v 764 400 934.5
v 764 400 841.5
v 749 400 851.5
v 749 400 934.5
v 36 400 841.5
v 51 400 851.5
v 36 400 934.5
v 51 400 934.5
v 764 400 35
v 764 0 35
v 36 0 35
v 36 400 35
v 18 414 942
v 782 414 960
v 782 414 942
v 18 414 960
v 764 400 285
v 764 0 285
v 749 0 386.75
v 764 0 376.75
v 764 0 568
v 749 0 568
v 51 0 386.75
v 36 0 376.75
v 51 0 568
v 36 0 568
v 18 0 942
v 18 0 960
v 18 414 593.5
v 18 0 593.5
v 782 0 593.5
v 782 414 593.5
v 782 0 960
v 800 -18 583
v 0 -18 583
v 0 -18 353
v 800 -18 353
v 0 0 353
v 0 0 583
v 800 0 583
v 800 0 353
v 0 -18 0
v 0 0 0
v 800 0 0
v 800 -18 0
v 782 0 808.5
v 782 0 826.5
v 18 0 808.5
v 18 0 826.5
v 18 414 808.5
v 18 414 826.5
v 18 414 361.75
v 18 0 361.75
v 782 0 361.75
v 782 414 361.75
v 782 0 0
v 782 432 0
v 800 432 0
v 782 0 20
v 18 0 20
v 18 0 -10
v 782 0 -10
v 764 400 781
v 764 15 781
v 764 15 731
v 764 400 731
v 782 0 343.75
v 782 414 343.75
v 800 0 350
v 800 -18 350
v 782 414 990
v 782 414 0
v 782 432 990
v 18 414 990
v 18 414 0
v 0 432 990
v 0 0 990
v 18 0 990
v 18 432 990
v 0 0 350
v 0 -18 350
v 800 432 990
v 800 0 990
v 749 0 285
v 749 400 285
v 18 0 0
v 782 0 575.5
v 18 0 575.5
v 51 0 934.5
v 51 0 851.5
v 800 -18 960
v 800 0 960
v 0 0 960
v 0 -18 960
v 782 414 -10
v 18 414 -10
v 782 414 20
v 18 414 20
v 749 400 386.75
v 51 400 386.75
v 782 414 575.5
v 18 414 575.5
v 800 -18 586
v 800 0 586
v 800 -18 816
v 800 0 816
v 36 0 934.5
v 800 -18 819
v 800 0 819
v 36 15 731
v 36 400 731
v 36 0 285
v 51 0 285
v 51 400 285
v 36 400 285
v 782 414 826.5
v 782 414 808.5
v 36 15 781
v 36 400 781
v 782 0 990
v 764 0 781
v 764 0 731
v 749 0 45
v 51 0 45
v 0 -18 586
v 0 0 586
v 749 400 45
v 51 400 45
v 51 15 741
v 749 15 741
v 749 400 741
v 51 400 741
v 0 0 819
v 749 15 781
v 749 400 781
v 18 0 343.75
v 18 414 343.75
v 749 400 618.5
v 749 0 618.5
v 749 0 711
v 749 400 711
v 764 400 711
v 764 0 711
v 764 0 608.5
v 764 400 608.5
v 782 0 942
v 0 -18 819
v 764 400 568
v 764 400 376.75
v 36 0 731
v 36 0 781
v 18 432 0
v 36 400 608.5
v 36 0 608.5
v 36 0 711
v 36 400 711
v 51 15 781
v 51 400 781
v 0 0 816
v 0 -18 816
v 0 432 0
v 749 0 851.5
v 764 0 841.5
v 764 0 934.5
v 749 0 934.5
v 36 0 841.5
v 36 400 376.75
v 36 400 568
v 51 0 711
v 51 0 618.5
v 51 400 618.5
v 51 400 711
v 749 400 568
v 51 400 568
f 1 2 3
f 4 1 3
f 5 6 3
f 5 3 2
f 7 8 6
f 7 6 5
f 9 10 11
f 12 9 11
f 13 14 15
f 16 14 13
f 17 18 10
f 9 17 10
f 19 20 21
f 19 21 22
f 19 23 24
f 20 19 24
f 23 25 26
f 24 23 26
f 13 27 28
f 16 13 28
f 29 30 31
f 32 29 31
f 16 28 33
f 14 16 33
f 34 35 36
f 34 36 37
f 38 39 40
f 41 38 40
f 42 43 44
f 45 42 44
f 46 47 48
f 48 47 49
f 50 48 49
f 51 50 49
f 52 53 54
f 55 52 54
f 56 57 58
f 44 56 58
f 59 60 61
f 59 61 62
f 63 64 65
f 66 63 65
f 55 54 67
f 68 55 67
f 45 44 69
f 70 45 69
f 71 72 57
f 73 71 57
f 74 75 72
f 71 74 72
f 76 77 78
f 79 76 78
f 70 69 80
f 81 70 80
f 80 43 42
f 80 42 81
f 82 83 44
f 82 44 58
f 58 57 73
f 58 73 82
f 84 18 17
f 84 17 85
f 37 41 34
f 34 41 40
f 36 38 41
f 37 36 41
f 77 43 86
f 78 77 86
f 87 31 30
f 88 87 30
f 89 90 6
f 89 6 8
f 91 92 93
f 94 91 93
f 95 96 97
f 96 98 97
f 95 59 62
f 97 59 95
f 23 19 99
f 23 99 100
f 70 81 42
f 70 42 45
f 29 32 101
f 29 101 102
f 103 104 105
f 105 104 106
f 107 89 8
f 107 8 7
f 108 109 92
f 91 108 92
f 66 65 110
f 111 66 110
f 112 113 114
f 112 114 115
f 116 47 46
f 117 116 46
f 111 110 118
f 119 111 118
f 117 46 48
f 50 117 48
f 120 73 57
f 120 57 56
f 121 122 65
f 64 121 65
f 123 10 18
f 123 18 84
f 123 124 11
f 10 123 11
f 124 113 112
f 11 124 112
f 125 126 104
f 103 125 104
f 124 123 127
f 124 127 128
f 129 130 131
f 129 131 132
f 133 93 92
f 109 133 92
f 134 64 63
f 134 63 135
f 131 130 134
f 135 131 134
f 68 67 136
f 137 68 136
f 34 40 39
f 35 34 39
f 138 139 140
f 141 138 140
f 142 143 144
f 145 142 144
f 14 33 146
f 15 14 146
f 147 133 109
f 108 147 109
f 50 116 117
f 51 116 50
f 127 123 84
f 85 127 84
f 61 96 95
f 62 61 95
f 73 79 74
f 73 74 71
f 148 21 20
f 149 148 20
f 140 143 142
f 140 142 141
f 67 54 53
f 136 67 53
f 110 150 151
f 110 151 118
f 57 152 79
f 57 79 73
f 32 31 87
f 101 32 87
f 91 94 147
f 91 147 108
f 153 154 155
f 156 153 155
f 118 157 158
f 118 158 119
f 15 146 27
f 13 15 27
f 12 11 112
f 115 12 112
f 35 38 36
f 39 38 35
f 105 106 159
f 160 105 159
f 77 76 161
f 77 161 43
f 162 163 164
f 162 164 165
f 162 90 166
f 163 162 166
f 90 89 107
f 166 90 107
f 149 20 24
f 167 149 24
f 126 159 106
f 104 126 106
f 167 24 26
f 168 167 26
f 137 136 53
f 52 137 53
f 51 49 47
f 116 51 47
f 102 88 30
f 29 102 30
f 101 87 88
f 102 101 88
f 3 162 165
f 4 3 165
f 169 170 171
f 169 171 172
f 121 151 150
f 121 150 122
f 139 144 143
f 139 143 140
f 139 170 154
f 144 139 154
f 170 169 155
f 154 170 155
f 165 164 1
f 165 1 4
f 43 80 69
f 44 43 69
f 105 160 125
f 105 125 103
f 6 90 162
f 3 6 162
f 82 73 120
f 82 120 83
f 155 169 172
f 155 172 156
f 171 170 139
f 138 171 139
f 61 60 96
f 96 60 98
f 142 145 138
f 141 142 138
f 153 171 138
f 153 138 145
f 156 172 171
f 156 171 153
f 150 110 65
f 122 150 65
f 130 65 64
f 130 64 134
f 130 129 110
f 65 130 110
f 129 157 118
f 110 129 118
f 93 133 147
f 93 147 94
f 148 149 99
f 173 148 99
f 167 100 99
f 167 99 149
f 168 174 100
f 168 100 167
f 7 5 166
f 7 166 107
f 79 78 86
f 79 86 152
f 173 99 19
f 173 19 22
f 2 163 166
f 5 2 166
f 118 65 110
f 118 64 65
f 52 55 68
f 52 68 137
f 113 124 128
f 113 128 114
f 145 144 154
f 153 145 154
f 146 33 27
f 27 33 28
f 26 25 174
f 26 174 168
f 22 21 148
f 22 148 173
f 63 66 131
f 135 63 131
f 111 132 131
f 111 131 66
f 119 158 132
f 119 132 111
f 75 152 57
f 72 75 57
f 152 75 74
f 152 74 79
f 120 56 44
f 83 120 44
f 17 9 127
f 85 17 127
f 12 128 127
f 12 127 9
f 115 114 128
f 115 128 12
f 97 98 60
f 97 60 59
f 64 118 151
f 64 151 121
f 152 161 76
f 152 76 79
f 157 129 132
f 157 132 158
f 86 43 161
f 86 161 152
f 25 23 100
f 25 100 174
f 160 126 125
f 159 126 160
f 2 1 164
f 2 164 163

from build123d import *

# Parameters (mm, degrees)
F0_W           = 18
F0_H           = 414
F0_H_2         = 18
F1_DEPTH       = 990
F0_W_2         = 764
F2_DEPTH       = 990
F3_DEPTH       = 20
F3_DEPTH_BACK  = 10
F4_W           = 782
F4_H           = 141
F4_W_2         = 18
F5_DEPTH       = 18
F4_W_3         = 600
F4_H_2         = 230
F4_W_4         = 3
F4_W_5         = 179
F4_W_6         = 582
F4_W_7         = 197
F4_H_3         = 350
F7_DEPTH       = 414
F6_W           = 698
F6_H           = 18
F6_W_2         = 15
F6_H_2         = 10
F6_H_3         = 83
F8_DEPTH       = 400
F6_H_4         = 40
F6_H_5         = 92.5
F6_H_6         = 181.2495863438
F6_H_7         = 240
F9_W           = 15
F9_H           = 15
F9_W_2         = 698
F10_DEPTH      = 40
F10_DEPTH_BACK = 10


# Not quite as in the source:
# - a feature names something its author has since deleted; it is built from what else it names


with BuildPart() as f1:
    # F0 (on Top) → F1 (new body)
    with BuildSketch(Plane.XY):
        with Locations((9, 207)):
            Rectangle(F0_W, F0_H)
        with Locations((9, 423)):
            Rectangle(F0_W, F0_H_2)
    extrude(amount=F1_DEPTH)


with BuildPart() as f1b:
    # F0 (on Top) → F1, piece 2 (new body)
    with BuildSketch(Plane.XY):
        with Locations((791, 423)):
            Rectangle(F0_W, F0_H_2)
        with Locations((791, 207)):
            Rectangle(F0_W, F0_H)
    extrude(amount=F1_DEPTH)


with BuildPart() as f2:
    # F0 (on Top) → F2 (new body, through all)
    with BuildSketch(Plane.XY):
        with Locations((400, 423)):
            Rectangle(F0_W_2, F0_H_2)
    extrude(amount=F2_DEPTH)


with BuildPart() as f3:
    # F0 (on Top) → F3 (new body, two sides)
    with BuildSketch(Plane.XY) as f3_sk:
        with Locations((400, 207)):
            Rectangle(F0_W_2, F0_H)
    extrude(amount=F3_DEPTH)
    extrude(f3_sk.sketch, amount=-F3_DEPTH_BACK)


with BuildPart() as f5:
    # F4 (on face) → F5 (new body)
    with BuildSketch(Plane.XZ):
        with Locations((409, 889.5)):
            Rectangle(F4_W, F4_H)
        with Locations((9, 889.5)):
            Rectangle(F4_W_2, F4_H)
    extrude(amount=F5_DEPTH)


with BuildPart() as f5b:
    # F4 (on face) → F5, piece 2 (new body)
    with BuildSketch(Plane.XZ):
        with Locations((500, 701)):
            Rectangle(F4_W_3, F4_H_2)
        with Locations((198.5, 701)):
            Rectangle(F4_W_4, F4_H_2)
        with Locations((107.5, 701)):
            Rectangle(F4_W_5, F4_H_2)
        with Locations((9, 701)):
            Rectangle(F4_W_2, F4_H_2)
    extrude(amount=F5_DEPTH)


with BuildPart() as f5c:
    # F4 (on face) → F5, piece 3 (new body)
    with BuildSketch(Plane.XZ):
        with Locations((309, 468)):
            Rectangle(F4_W_6, F4_H_2)
        with Locations((9, 468)):
            Rectangle(F4_W_2, F4_H_2)
        with Locations((601.5, 468)):
            Rectangle(F4_W_4, F4_H_2)
        with Locations((701.5, 468)):
            Rectangle(F4_W_7, F4_H_2)
    extrude(amount=F5_DEPTH)


with BuildPart() as f5d:
    # F4 (on face) → F5, piece 4 (new body)
    with BuildSketch(Plane.XZ):
        with Locations((107.5, 175)):
            Rectangle(F4_W_5, F4_H_3)
        with Locations((9, 175)):
            Rectangle(F4_W_2, F4_H_3)
        with Locations((500, 175)):
            Rectangle(F4_W_3, F4_H_3)
        with Locations((198.5, 175)):
            Rectangle(F4_W_4, F4_H_3)
    extrude(amount=F5_DEPTH)


with BuildPart() as f7:
    # F6 (on face) → F7 (new body, through all)
    with BuildSketch(Plane(origin=(0, 0, 0), x_dir=(-1, 0, 0), z_dir=(0, 1, 0))):
        Polygon((-782, 960), (-782, 942), (-764, 942), (-749, 942), (-36, 942), (-18, 942), (-18, 960), align=None)
    extrude(amount=F7_DEPTH)


with BuildPart() as f7b:
    # F6 (on face) → F7, piece 2 (new body, through all)
    with BuildSketch(Plane(origin=(0, 0, 0), x_dir=(-1, 0, 0), z_dir=(0, 1, 0))):
        Polygon((-764, 826.5), (-782, 826.5), (-782, 819), (-18, 819), (-18, 826.5), (-36, 826.5), align=None)
        Polygon((-18, 819), (-782, 819), (-782, 808.5), (-764, 808.5), (-749, 808.5), (-51, 808.5), (-36, 808.5), (-18, 808.5), align=None)
    extrude(amount=F7_DEPTH)


with BuildPart() as f7c:
    # F6 (on face) → F7, piece 3 (new body, through all)
    with BuildSketch(Plane(origin=(0, 0, 0), x_dir=(-1, 0, 0), z_dir=(0, 1, 0))):
        Polygon((-764, 593.5), (-782, 593.5), (-782, 575.5), (-764, 575.5), (-749, 575.5), (-749, 593.5), align=None)
        with Locations((-400, 584.5)):
            Rectangle(F6_W, F6_H)
        Polygon((-36, 593.5), (-51, 593.5), (-51, 575.5), (-36, 575.5), (-18, 575.5), (-18, 593.5), align=None)
    extrude(amount=F7_DEPTH)


with BuildPart() as f7d:
    # F6 (on face) → F7, piece 4 (new body, through all)
    with BuildSketch(Plane(origin=(0, 0, 0), x_dir=(-1, 0, 0), z_dir=(0, 1, 0))):
        Polygon((-764, 361.7504136562), (-782, 361.7504136562), (-782, 343.7504136562), (-764, 343.7504136562), (-749, 343.7504136562), (-749, 361.7504136562), align=None)
        with Locations((-400, 352.7504136562)):
            Rectangle(F6_W, F6_H)
        Polygon((-36, 361.7504136562), (-51, 361.7504136562), (-51, 343.7504136562), (-36, 343.7504136562), (-18, 343.7504136562), (-18, 361.7504136562), align=None)
    extrude(amount=F7_DEPTH)


with BuildPart() as f8:
    # F6 (on face) → F8 (new body)
    with BuildSketch(Plane(origin=(0, 0, 0), x_dir=(-1, 0, 0), z_dir=(0, 1, 0))):
        with Locations((-756.5, 846.5)):
            Rectangle(F6_W_2, F6_H_2)
        with Locations((-43.5, 846.5)):
            Rectangle(F6_W_2, F6_H_2)
        with Locations((-756.5, 893)):
            Rectangle(F6_W_2, F6_H_3)
        with Locations((-400, 846.5)):
            Rectangle(F6_W, F6_H_2)
        with Locations((-43.5, 893)):
            Rectangle(F6_W_2, F6_H_3)
    extrude(amount=F8_DEPTH)


with BuildPart() as f8b:
    # F6 (on face) → F8, piece 2 (new body)
    with BuildSketch(Plane(origin=(0, 0, 0), x_dir=(-1, 0, 0), z_dir=(0, 1, 0))):
        with Locations((-756.5, 761)):
            Rectangle(F6_W_2, F6_H_4)
        with Locations((-756.5, 736)):
            Rectangle(F6_W_2, F6_H_2)
        with Locations((-43.5, 761)):
            Rectangle(F6_W_2, F6_H_4)
        with Locations((-400, 736)):
            Rectangle(F6_W, F6_H_2)
        with Locations((-43.5, 736)):
            Rectangle(F6_W_2, F6_H_2)
    extrude(amount=F8_DEPTH)


with BuildPart() as f8c:
    # F6 (on face) → F8, piece 3 (new body)
    with BuildSketch(Plane(origin=(0, 0, 0), x_dir=(-1, 0, 0), z_dir=(0, 1, 0))):
        with Locations((-756.5, 613.5)):
            Rectangle(F6_W_2, F6_H_2)
        with Locations((-756.5, 664.75)):
            Rectangle(F6_W_2, F6_H_5)
        with Locations((-400, 613.5)):
            Rectangle(F6_W, F6_H_2)
        with Locations((-43.5, 613.5)):
            Rectangle(F6_W_2, F6_H_2)
        with Locations((-43.5, 664.75)):
            Rectangle(F6_W_2, F6_H_5)
    extrude(amount=F8_DEPTH)


with BuildPart() as f8d:
    # F6 (on face) → F8, piece 4 (new body)
    with BuildSketch(Plane(origin=(0, 0, 0), x_dir=(-1, 0, 0), z_dir=(0, 1, 0))):
        with Locations((-756.5, 477.3752068281)):
            Rectangle(F6_W_2, F6_H_6)
        with Locations((-756.5, 381.7504136562)):
            Rectangle(F6_W_2, F6_H_2)
        with Locations((-43.5, 477.3752068281)):
            Rectangle(F6_W_2, F6_H_6)
        with Locations((-400, 381.7504136562)):
            Rectangle(F6_W, F6_H_2)
        with Locations((-43.5, 381.7504136562)):
            Rectangle(F6_W_2, F6_H_2)
    extrude(amount=F8_DEPTH)


with BuildPart() as f8e:
    # F6 (on face) → F8, piece 5 (new body)
    with BuildSketch(Plane(origin=(0, 0, 0), x_dir=(-1, 0, 0), z_dir=(0, 1, 0))):
        with Locations((-756.5, 165)):
            Rectangle(F6_W_2, F6_H_7)
        with Locations((-756.5, 40)):
            Rectangle(F6_W_2, F6_H_2)
        with Locations((-400, 40)):
            Rectangle(F6_W, F6_H_2)
        with Locations((-43.5, 165)):
            Rectangle(F6_W_2, F6_H_7)
        with Locations((-43.5, 40)):
            Rectangle(F6_W_2, F6_H_2)
    extrude(amount=F8_DEPTH)


with BuildPart() as f10:
    # F9 (on face) → F10 (new body, two sides)
    with BuildSketch(Plane.XY.offset(741)) as f10_sk:
        with Locations((43.5, 7.5)):
            Rectangle(F9_W, F9_H)
        with Locations((400, 7.5)):
            Rectangle(F9_W_2, F9_H)
        with Locations((756.5, 7.5)):
            Rectangle(F9_W, F9_H)
    extrude(amount=F10_DEPTH)
    extrude(f10_sk.sketch, amount=-F10_DEPTH_BACK)


with BuildPart() as f8b_1:
    add(f8b.part)

    # F11: cut F10
    add(f10.part, mode=Mode.SUBTRACT)


solid = Compound([f1.part, f1b.part, f2.part, f3.part, f5.part, f5b.part, f5c.part, f5d.part, f7.part, f7b.part, f7c.part, f7d.part, f8.part, f8c.part, f8d.part, f8e.part, f10.part, f8b_1.part])
